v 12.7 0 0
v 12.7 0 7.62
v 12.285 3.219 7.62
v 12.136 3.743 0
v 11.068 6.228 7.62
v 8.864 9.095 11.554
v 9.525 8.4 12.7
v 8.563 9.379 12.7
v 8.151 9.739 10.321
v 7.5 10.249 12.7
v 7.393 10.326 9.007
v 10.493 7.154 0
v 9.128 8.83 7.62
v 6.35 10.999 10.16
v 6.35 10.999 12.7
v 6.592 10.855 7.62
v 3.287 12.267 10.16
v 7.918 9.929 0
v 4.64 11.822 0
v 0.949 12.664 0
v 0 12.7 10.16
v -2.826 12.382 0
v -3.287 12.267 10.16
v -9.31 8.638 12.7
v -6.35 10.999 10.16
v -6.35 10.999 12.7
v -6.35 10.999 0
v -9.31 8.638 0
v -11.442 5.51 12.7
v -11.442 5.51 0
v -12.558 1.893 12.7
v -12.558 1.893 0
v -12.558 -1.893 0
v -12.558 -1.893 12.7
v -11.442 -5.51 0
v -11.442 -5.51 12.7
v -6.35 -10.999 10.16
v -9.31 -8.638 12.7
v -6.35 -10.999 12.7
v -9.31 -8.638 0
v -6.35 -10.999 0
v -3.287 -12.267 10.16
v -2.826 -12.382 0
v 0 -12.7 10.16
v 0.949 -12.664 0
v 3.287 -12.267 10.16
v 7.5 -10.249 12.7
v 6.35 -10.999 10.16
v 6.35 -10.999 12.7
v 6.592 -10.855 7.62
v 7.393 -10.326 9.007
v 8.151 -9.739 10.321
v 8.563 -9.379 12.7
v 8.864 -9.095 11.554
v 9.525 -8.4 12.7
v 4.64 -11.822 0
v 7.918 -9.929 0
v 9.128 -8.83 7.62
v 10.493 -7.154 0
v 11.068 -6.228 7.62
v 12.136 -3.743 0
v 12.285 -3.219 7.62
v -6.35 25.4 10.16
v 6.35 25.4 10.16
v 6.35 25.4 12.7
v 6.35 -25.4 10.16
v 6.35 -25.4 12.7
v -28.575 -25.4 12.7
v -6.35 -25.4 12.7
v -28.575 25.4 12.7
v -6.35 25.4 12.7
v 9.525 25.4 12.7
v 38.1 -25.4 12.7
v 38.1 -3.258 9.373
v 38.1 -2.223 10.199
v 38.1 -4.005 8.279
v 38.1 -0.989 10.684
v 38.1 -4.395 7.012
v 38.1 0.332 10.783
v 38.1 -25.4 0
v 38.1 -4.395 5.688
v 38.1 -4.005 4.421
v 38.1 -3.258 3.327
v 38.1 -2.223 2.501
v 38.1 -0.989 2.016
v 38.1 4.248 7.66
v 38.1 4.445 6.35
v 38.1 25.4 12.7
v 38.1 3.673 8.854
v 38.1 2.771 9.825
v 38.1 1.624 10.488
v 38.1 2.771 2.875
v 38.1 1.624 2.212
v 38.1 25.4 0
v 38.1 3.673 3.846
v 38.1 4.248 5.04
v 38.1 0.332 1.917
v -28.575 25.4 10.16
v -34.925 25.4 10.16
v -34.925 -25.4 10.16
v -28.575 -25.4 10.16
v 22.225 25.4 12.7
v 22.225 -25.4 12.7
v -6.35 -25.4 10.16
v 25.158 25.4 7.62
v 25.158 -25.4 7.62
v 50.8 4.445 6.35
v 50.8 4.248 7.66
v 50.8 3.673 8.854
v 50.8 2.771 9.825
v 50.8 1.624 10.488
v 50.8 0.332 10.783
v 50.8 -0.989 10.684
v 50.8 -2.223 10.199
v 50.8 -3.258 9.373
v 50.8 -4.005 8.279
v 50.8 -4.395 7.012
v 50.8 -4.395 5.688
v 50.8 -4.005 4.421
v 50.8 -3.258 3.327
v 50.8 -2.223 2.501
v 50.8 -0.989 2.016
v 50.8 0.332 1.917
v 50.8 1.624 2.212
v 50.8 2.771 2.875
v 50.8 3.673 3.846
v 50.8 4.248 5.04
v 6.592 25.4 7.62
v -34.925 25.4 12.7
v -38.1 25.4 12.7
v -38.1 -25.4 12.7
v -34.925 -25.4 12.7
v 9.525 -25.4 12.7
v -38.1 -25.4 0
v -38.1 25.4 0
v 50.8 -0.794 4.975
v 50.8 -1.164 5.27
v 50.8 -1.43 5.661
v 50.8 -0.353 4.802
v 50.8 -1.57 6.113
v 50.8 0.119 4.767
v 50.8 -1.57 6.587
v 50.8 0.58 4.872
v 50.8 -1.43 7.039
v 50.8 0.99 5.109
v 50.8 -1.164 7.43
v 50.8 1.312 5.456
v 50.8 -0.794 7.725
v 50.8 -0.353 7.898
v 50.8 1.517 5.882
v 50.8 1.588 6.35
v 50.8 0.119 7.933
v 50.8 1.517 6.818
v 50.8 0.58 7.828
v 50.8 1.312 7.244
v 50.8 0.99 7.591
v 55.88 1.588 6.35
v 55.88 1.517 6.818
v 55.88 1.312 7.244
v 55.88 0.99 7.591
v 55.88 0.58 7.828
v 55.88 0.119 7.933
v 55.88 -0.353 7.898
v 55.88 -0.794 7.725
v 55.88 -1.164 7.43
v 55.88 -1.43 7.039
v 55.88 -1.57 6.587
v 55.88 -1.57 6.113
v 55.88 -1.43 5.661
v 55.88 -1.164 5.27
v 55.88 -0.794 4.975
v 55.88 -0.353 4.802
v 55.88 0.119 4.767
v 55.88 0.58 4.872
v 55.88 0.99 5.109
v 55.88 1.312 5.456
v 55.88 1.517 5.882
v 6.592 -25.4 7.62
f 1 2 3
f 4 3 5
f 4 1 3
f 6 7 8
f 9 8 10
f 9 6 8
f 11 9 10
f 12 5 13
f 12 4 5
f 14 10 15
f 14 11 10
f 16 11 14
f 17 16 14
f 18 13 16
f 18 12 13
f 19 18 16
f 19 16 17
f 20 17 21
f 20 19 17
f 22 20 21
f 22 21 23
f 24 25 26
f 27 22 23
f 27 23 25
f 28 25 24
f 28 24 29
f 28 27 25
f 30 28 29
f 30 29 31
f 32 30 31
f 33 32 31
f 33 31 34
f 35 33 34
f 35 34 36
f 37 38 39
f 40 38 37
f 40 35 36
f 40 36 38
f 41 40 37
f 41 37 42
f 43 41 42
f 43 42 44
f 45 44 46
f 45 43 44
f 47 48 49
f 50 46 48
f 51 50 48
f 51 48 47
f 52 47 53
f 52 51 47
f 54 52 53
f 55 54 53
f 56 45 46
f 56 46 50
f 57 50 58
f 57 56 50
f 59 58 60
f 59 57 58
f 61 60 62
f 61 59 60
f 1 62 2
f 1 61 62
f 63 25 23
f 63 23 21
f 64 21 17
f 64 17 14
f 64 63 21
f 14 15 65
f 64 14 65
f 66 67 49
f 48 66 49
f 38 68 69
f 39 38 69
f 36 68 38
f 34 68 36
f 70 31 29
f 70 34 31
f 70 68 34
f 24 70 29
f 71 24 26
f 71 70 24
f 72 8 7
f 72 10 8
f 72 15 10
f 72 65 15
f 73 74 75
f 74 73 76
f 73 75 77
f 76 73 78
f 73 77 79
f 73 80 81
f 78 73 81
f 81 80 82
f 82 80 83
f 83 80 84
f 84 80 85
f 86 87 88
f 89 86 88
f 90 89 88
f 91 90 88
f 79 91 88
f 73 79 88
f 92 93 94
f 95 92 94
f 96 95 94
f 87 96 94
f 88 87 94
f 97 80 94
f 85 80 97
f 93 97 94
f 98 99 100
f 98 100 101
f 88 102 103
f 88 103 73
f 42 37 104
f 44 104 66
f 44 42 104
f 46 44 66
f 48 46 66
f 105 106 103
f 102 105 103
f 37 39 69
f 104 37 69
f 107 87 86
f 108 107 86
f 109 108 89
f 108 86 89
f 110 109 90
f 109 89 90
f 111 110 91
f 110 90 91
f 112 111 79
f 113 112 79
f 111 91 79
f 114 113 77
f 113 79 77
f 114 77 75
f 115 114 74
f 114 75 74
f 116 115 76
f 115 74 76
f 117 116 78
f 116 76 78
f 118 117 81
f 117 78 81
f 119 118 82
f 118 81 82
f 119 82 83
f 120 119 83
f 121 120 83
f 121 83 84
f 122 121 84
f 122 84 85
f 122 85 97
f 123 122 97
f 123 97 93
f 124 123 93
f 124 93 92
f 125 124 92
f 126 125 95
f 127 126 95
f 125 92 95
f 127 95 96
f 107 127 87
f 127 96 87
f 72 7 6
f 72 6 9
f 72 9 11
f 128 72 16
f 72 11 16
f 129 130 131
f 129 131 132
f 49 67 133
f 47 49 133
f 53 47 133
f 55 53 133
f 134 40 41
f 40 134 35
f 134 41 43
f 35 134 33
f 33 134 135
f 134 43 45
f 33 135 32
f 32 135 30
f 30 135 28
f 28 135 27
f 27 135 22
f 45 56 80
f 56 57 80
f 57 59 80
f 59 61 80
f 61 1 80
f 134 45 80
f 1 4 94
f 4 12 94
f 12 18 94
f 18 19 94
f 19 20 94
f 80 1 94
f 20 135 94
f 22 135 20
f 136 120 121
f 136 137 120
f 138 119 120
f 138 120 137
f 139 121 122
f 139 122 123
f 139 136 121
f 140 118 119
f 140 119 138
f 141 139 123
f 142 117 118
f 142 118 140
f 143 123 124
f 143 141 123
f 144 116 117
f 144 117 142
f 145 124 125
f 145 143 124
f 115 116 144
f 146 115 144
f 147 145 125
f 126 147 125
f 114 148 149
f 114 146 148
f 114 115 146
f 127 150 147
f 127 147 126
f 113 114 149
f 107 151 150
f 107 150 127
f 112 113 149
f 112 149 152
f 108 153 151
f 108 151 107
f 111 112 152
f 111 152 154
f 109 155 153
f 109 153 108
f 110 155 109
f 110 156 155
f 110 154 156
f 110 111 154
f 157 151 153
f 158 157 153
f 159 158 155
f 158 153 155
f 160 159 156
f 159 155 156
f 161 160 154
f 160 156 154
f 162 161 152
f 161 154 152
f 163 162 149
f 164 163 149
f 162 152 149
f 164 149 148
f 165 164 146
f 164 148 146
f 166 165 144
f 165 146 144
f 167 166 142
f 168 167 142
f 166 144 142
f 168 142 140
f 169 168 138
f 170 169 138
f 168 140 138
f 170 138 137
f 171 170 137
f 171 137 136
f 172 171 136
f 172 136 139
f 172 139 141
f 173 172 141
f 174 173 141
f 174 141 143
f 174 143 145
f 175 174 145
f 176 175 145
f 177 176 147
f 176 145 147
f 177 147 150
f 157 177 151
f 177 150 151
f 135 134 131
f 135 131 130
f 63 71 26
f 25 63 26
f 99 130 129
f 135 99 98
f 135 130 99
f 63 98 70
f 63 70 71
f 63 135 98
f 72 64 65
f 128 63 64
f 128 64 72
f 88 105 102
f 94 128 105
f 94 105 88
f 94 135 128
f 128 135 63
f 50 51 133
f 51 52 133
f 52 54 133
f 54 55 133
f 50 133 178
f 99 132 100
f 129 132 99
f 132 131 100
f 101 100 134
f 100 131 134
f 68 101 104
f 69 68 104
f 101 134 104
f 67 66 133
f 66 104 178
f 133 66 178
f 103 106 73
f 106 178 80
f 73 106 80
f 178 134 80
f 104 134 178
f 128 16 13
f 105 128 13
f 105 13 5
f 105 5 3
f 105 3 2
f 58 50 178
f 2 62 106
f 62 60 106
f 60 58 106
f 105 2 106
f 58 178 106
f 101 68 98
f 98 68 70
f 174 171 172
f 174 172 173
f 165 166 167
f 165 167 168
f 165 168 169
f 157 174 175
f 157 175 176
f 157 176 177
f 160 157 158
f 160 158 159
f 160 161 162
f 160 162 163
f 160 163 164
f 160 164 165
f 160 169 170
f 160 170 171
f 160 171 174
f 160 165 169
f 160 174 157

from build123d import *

# Parameters (mm, degrees)
F0_W     = 76.2
F0_H     = 50.8
F0_R     = 12.7
F1_DEPTH = 12.7
F2_W     = 6.35
F2_H     = 50.8
F3_DEPTH = 2.54
F5_DEPTH = 50.8
F6_R     = 4.445
F7_DEPTH = 12.7
F8_R     = 1.5875
F9_DEPTH = 5.08


with BuildPart() as f1:
    # F0 (on Top) → F1 (new body)
    with BuildSketch(Plane.XY):
        Rectangle(F0_W, F0_H)
        Circle(F0_R, mode=Mode.SUBTRACT)
    extrude(amount=F1_DEPTH)

    # F2 (on face) → F3 (cut)
    with BuildSketch(Plane.XY.offset(12.7)):
        with Locations((-31.75, 0)):
            Rectangle(F2_W, F2_H)
        with BuildLine():
            Line((-6.35, -10.9985226281), (-6.35, -25.4))
            Line((-6.35, -25.4), (6.35, -25.4))
            Line((6.35, -25.4), (6.35, -10.9985226281))
            ThreePointArc((6.35, -10.9985226281), (0, -12.7), (-6.35, -10.9985226281))
        make_face()
        with BuildLine():
            Line((6.35, 25.4), (-6.35, 25.4))
            Line((-6.35, 25.4), (-6.35, 10.9985226281))
            ThreePointArc((-6.35, 10.9985226281), (0, 12.7), (6.35, 10.9985226281))
            Line((6.35, 10.9985226281), (6.35, 25.4))
        make_face()
    extrude(amount=-F3_DEPTH, mode=Mode.SUBTRACT)

    # F4 (on face) → F5 (cut, through all)
    with BuildSketch(Plane.XZ.offset(25.4)):
        Polygon((22.225, 12.7), (9.525, 12.7), (6.5920606325, 7.62), (25.1579393675, 7.62), align=None)
    extrude(amount=-F5_DEPTH, mode=Mode.SUBTRACT)

    # F6 (on face) → F7 (join)
    with BuildSketch(Plane.YZ.offset(38.1)):
        with Locations((0, 6.35)):
            Circle(F6_R)
    extrude(amount=F7_DEPTH)

    # F8 (on face) → F9 (join)
    with BuildSketch(Plane.YZ.offset(50.8)):
        with Locations((0, 6.35)):
            Circle(F8_R)
    extrude(amount=F9_DEPTH)


solid = f1.part
